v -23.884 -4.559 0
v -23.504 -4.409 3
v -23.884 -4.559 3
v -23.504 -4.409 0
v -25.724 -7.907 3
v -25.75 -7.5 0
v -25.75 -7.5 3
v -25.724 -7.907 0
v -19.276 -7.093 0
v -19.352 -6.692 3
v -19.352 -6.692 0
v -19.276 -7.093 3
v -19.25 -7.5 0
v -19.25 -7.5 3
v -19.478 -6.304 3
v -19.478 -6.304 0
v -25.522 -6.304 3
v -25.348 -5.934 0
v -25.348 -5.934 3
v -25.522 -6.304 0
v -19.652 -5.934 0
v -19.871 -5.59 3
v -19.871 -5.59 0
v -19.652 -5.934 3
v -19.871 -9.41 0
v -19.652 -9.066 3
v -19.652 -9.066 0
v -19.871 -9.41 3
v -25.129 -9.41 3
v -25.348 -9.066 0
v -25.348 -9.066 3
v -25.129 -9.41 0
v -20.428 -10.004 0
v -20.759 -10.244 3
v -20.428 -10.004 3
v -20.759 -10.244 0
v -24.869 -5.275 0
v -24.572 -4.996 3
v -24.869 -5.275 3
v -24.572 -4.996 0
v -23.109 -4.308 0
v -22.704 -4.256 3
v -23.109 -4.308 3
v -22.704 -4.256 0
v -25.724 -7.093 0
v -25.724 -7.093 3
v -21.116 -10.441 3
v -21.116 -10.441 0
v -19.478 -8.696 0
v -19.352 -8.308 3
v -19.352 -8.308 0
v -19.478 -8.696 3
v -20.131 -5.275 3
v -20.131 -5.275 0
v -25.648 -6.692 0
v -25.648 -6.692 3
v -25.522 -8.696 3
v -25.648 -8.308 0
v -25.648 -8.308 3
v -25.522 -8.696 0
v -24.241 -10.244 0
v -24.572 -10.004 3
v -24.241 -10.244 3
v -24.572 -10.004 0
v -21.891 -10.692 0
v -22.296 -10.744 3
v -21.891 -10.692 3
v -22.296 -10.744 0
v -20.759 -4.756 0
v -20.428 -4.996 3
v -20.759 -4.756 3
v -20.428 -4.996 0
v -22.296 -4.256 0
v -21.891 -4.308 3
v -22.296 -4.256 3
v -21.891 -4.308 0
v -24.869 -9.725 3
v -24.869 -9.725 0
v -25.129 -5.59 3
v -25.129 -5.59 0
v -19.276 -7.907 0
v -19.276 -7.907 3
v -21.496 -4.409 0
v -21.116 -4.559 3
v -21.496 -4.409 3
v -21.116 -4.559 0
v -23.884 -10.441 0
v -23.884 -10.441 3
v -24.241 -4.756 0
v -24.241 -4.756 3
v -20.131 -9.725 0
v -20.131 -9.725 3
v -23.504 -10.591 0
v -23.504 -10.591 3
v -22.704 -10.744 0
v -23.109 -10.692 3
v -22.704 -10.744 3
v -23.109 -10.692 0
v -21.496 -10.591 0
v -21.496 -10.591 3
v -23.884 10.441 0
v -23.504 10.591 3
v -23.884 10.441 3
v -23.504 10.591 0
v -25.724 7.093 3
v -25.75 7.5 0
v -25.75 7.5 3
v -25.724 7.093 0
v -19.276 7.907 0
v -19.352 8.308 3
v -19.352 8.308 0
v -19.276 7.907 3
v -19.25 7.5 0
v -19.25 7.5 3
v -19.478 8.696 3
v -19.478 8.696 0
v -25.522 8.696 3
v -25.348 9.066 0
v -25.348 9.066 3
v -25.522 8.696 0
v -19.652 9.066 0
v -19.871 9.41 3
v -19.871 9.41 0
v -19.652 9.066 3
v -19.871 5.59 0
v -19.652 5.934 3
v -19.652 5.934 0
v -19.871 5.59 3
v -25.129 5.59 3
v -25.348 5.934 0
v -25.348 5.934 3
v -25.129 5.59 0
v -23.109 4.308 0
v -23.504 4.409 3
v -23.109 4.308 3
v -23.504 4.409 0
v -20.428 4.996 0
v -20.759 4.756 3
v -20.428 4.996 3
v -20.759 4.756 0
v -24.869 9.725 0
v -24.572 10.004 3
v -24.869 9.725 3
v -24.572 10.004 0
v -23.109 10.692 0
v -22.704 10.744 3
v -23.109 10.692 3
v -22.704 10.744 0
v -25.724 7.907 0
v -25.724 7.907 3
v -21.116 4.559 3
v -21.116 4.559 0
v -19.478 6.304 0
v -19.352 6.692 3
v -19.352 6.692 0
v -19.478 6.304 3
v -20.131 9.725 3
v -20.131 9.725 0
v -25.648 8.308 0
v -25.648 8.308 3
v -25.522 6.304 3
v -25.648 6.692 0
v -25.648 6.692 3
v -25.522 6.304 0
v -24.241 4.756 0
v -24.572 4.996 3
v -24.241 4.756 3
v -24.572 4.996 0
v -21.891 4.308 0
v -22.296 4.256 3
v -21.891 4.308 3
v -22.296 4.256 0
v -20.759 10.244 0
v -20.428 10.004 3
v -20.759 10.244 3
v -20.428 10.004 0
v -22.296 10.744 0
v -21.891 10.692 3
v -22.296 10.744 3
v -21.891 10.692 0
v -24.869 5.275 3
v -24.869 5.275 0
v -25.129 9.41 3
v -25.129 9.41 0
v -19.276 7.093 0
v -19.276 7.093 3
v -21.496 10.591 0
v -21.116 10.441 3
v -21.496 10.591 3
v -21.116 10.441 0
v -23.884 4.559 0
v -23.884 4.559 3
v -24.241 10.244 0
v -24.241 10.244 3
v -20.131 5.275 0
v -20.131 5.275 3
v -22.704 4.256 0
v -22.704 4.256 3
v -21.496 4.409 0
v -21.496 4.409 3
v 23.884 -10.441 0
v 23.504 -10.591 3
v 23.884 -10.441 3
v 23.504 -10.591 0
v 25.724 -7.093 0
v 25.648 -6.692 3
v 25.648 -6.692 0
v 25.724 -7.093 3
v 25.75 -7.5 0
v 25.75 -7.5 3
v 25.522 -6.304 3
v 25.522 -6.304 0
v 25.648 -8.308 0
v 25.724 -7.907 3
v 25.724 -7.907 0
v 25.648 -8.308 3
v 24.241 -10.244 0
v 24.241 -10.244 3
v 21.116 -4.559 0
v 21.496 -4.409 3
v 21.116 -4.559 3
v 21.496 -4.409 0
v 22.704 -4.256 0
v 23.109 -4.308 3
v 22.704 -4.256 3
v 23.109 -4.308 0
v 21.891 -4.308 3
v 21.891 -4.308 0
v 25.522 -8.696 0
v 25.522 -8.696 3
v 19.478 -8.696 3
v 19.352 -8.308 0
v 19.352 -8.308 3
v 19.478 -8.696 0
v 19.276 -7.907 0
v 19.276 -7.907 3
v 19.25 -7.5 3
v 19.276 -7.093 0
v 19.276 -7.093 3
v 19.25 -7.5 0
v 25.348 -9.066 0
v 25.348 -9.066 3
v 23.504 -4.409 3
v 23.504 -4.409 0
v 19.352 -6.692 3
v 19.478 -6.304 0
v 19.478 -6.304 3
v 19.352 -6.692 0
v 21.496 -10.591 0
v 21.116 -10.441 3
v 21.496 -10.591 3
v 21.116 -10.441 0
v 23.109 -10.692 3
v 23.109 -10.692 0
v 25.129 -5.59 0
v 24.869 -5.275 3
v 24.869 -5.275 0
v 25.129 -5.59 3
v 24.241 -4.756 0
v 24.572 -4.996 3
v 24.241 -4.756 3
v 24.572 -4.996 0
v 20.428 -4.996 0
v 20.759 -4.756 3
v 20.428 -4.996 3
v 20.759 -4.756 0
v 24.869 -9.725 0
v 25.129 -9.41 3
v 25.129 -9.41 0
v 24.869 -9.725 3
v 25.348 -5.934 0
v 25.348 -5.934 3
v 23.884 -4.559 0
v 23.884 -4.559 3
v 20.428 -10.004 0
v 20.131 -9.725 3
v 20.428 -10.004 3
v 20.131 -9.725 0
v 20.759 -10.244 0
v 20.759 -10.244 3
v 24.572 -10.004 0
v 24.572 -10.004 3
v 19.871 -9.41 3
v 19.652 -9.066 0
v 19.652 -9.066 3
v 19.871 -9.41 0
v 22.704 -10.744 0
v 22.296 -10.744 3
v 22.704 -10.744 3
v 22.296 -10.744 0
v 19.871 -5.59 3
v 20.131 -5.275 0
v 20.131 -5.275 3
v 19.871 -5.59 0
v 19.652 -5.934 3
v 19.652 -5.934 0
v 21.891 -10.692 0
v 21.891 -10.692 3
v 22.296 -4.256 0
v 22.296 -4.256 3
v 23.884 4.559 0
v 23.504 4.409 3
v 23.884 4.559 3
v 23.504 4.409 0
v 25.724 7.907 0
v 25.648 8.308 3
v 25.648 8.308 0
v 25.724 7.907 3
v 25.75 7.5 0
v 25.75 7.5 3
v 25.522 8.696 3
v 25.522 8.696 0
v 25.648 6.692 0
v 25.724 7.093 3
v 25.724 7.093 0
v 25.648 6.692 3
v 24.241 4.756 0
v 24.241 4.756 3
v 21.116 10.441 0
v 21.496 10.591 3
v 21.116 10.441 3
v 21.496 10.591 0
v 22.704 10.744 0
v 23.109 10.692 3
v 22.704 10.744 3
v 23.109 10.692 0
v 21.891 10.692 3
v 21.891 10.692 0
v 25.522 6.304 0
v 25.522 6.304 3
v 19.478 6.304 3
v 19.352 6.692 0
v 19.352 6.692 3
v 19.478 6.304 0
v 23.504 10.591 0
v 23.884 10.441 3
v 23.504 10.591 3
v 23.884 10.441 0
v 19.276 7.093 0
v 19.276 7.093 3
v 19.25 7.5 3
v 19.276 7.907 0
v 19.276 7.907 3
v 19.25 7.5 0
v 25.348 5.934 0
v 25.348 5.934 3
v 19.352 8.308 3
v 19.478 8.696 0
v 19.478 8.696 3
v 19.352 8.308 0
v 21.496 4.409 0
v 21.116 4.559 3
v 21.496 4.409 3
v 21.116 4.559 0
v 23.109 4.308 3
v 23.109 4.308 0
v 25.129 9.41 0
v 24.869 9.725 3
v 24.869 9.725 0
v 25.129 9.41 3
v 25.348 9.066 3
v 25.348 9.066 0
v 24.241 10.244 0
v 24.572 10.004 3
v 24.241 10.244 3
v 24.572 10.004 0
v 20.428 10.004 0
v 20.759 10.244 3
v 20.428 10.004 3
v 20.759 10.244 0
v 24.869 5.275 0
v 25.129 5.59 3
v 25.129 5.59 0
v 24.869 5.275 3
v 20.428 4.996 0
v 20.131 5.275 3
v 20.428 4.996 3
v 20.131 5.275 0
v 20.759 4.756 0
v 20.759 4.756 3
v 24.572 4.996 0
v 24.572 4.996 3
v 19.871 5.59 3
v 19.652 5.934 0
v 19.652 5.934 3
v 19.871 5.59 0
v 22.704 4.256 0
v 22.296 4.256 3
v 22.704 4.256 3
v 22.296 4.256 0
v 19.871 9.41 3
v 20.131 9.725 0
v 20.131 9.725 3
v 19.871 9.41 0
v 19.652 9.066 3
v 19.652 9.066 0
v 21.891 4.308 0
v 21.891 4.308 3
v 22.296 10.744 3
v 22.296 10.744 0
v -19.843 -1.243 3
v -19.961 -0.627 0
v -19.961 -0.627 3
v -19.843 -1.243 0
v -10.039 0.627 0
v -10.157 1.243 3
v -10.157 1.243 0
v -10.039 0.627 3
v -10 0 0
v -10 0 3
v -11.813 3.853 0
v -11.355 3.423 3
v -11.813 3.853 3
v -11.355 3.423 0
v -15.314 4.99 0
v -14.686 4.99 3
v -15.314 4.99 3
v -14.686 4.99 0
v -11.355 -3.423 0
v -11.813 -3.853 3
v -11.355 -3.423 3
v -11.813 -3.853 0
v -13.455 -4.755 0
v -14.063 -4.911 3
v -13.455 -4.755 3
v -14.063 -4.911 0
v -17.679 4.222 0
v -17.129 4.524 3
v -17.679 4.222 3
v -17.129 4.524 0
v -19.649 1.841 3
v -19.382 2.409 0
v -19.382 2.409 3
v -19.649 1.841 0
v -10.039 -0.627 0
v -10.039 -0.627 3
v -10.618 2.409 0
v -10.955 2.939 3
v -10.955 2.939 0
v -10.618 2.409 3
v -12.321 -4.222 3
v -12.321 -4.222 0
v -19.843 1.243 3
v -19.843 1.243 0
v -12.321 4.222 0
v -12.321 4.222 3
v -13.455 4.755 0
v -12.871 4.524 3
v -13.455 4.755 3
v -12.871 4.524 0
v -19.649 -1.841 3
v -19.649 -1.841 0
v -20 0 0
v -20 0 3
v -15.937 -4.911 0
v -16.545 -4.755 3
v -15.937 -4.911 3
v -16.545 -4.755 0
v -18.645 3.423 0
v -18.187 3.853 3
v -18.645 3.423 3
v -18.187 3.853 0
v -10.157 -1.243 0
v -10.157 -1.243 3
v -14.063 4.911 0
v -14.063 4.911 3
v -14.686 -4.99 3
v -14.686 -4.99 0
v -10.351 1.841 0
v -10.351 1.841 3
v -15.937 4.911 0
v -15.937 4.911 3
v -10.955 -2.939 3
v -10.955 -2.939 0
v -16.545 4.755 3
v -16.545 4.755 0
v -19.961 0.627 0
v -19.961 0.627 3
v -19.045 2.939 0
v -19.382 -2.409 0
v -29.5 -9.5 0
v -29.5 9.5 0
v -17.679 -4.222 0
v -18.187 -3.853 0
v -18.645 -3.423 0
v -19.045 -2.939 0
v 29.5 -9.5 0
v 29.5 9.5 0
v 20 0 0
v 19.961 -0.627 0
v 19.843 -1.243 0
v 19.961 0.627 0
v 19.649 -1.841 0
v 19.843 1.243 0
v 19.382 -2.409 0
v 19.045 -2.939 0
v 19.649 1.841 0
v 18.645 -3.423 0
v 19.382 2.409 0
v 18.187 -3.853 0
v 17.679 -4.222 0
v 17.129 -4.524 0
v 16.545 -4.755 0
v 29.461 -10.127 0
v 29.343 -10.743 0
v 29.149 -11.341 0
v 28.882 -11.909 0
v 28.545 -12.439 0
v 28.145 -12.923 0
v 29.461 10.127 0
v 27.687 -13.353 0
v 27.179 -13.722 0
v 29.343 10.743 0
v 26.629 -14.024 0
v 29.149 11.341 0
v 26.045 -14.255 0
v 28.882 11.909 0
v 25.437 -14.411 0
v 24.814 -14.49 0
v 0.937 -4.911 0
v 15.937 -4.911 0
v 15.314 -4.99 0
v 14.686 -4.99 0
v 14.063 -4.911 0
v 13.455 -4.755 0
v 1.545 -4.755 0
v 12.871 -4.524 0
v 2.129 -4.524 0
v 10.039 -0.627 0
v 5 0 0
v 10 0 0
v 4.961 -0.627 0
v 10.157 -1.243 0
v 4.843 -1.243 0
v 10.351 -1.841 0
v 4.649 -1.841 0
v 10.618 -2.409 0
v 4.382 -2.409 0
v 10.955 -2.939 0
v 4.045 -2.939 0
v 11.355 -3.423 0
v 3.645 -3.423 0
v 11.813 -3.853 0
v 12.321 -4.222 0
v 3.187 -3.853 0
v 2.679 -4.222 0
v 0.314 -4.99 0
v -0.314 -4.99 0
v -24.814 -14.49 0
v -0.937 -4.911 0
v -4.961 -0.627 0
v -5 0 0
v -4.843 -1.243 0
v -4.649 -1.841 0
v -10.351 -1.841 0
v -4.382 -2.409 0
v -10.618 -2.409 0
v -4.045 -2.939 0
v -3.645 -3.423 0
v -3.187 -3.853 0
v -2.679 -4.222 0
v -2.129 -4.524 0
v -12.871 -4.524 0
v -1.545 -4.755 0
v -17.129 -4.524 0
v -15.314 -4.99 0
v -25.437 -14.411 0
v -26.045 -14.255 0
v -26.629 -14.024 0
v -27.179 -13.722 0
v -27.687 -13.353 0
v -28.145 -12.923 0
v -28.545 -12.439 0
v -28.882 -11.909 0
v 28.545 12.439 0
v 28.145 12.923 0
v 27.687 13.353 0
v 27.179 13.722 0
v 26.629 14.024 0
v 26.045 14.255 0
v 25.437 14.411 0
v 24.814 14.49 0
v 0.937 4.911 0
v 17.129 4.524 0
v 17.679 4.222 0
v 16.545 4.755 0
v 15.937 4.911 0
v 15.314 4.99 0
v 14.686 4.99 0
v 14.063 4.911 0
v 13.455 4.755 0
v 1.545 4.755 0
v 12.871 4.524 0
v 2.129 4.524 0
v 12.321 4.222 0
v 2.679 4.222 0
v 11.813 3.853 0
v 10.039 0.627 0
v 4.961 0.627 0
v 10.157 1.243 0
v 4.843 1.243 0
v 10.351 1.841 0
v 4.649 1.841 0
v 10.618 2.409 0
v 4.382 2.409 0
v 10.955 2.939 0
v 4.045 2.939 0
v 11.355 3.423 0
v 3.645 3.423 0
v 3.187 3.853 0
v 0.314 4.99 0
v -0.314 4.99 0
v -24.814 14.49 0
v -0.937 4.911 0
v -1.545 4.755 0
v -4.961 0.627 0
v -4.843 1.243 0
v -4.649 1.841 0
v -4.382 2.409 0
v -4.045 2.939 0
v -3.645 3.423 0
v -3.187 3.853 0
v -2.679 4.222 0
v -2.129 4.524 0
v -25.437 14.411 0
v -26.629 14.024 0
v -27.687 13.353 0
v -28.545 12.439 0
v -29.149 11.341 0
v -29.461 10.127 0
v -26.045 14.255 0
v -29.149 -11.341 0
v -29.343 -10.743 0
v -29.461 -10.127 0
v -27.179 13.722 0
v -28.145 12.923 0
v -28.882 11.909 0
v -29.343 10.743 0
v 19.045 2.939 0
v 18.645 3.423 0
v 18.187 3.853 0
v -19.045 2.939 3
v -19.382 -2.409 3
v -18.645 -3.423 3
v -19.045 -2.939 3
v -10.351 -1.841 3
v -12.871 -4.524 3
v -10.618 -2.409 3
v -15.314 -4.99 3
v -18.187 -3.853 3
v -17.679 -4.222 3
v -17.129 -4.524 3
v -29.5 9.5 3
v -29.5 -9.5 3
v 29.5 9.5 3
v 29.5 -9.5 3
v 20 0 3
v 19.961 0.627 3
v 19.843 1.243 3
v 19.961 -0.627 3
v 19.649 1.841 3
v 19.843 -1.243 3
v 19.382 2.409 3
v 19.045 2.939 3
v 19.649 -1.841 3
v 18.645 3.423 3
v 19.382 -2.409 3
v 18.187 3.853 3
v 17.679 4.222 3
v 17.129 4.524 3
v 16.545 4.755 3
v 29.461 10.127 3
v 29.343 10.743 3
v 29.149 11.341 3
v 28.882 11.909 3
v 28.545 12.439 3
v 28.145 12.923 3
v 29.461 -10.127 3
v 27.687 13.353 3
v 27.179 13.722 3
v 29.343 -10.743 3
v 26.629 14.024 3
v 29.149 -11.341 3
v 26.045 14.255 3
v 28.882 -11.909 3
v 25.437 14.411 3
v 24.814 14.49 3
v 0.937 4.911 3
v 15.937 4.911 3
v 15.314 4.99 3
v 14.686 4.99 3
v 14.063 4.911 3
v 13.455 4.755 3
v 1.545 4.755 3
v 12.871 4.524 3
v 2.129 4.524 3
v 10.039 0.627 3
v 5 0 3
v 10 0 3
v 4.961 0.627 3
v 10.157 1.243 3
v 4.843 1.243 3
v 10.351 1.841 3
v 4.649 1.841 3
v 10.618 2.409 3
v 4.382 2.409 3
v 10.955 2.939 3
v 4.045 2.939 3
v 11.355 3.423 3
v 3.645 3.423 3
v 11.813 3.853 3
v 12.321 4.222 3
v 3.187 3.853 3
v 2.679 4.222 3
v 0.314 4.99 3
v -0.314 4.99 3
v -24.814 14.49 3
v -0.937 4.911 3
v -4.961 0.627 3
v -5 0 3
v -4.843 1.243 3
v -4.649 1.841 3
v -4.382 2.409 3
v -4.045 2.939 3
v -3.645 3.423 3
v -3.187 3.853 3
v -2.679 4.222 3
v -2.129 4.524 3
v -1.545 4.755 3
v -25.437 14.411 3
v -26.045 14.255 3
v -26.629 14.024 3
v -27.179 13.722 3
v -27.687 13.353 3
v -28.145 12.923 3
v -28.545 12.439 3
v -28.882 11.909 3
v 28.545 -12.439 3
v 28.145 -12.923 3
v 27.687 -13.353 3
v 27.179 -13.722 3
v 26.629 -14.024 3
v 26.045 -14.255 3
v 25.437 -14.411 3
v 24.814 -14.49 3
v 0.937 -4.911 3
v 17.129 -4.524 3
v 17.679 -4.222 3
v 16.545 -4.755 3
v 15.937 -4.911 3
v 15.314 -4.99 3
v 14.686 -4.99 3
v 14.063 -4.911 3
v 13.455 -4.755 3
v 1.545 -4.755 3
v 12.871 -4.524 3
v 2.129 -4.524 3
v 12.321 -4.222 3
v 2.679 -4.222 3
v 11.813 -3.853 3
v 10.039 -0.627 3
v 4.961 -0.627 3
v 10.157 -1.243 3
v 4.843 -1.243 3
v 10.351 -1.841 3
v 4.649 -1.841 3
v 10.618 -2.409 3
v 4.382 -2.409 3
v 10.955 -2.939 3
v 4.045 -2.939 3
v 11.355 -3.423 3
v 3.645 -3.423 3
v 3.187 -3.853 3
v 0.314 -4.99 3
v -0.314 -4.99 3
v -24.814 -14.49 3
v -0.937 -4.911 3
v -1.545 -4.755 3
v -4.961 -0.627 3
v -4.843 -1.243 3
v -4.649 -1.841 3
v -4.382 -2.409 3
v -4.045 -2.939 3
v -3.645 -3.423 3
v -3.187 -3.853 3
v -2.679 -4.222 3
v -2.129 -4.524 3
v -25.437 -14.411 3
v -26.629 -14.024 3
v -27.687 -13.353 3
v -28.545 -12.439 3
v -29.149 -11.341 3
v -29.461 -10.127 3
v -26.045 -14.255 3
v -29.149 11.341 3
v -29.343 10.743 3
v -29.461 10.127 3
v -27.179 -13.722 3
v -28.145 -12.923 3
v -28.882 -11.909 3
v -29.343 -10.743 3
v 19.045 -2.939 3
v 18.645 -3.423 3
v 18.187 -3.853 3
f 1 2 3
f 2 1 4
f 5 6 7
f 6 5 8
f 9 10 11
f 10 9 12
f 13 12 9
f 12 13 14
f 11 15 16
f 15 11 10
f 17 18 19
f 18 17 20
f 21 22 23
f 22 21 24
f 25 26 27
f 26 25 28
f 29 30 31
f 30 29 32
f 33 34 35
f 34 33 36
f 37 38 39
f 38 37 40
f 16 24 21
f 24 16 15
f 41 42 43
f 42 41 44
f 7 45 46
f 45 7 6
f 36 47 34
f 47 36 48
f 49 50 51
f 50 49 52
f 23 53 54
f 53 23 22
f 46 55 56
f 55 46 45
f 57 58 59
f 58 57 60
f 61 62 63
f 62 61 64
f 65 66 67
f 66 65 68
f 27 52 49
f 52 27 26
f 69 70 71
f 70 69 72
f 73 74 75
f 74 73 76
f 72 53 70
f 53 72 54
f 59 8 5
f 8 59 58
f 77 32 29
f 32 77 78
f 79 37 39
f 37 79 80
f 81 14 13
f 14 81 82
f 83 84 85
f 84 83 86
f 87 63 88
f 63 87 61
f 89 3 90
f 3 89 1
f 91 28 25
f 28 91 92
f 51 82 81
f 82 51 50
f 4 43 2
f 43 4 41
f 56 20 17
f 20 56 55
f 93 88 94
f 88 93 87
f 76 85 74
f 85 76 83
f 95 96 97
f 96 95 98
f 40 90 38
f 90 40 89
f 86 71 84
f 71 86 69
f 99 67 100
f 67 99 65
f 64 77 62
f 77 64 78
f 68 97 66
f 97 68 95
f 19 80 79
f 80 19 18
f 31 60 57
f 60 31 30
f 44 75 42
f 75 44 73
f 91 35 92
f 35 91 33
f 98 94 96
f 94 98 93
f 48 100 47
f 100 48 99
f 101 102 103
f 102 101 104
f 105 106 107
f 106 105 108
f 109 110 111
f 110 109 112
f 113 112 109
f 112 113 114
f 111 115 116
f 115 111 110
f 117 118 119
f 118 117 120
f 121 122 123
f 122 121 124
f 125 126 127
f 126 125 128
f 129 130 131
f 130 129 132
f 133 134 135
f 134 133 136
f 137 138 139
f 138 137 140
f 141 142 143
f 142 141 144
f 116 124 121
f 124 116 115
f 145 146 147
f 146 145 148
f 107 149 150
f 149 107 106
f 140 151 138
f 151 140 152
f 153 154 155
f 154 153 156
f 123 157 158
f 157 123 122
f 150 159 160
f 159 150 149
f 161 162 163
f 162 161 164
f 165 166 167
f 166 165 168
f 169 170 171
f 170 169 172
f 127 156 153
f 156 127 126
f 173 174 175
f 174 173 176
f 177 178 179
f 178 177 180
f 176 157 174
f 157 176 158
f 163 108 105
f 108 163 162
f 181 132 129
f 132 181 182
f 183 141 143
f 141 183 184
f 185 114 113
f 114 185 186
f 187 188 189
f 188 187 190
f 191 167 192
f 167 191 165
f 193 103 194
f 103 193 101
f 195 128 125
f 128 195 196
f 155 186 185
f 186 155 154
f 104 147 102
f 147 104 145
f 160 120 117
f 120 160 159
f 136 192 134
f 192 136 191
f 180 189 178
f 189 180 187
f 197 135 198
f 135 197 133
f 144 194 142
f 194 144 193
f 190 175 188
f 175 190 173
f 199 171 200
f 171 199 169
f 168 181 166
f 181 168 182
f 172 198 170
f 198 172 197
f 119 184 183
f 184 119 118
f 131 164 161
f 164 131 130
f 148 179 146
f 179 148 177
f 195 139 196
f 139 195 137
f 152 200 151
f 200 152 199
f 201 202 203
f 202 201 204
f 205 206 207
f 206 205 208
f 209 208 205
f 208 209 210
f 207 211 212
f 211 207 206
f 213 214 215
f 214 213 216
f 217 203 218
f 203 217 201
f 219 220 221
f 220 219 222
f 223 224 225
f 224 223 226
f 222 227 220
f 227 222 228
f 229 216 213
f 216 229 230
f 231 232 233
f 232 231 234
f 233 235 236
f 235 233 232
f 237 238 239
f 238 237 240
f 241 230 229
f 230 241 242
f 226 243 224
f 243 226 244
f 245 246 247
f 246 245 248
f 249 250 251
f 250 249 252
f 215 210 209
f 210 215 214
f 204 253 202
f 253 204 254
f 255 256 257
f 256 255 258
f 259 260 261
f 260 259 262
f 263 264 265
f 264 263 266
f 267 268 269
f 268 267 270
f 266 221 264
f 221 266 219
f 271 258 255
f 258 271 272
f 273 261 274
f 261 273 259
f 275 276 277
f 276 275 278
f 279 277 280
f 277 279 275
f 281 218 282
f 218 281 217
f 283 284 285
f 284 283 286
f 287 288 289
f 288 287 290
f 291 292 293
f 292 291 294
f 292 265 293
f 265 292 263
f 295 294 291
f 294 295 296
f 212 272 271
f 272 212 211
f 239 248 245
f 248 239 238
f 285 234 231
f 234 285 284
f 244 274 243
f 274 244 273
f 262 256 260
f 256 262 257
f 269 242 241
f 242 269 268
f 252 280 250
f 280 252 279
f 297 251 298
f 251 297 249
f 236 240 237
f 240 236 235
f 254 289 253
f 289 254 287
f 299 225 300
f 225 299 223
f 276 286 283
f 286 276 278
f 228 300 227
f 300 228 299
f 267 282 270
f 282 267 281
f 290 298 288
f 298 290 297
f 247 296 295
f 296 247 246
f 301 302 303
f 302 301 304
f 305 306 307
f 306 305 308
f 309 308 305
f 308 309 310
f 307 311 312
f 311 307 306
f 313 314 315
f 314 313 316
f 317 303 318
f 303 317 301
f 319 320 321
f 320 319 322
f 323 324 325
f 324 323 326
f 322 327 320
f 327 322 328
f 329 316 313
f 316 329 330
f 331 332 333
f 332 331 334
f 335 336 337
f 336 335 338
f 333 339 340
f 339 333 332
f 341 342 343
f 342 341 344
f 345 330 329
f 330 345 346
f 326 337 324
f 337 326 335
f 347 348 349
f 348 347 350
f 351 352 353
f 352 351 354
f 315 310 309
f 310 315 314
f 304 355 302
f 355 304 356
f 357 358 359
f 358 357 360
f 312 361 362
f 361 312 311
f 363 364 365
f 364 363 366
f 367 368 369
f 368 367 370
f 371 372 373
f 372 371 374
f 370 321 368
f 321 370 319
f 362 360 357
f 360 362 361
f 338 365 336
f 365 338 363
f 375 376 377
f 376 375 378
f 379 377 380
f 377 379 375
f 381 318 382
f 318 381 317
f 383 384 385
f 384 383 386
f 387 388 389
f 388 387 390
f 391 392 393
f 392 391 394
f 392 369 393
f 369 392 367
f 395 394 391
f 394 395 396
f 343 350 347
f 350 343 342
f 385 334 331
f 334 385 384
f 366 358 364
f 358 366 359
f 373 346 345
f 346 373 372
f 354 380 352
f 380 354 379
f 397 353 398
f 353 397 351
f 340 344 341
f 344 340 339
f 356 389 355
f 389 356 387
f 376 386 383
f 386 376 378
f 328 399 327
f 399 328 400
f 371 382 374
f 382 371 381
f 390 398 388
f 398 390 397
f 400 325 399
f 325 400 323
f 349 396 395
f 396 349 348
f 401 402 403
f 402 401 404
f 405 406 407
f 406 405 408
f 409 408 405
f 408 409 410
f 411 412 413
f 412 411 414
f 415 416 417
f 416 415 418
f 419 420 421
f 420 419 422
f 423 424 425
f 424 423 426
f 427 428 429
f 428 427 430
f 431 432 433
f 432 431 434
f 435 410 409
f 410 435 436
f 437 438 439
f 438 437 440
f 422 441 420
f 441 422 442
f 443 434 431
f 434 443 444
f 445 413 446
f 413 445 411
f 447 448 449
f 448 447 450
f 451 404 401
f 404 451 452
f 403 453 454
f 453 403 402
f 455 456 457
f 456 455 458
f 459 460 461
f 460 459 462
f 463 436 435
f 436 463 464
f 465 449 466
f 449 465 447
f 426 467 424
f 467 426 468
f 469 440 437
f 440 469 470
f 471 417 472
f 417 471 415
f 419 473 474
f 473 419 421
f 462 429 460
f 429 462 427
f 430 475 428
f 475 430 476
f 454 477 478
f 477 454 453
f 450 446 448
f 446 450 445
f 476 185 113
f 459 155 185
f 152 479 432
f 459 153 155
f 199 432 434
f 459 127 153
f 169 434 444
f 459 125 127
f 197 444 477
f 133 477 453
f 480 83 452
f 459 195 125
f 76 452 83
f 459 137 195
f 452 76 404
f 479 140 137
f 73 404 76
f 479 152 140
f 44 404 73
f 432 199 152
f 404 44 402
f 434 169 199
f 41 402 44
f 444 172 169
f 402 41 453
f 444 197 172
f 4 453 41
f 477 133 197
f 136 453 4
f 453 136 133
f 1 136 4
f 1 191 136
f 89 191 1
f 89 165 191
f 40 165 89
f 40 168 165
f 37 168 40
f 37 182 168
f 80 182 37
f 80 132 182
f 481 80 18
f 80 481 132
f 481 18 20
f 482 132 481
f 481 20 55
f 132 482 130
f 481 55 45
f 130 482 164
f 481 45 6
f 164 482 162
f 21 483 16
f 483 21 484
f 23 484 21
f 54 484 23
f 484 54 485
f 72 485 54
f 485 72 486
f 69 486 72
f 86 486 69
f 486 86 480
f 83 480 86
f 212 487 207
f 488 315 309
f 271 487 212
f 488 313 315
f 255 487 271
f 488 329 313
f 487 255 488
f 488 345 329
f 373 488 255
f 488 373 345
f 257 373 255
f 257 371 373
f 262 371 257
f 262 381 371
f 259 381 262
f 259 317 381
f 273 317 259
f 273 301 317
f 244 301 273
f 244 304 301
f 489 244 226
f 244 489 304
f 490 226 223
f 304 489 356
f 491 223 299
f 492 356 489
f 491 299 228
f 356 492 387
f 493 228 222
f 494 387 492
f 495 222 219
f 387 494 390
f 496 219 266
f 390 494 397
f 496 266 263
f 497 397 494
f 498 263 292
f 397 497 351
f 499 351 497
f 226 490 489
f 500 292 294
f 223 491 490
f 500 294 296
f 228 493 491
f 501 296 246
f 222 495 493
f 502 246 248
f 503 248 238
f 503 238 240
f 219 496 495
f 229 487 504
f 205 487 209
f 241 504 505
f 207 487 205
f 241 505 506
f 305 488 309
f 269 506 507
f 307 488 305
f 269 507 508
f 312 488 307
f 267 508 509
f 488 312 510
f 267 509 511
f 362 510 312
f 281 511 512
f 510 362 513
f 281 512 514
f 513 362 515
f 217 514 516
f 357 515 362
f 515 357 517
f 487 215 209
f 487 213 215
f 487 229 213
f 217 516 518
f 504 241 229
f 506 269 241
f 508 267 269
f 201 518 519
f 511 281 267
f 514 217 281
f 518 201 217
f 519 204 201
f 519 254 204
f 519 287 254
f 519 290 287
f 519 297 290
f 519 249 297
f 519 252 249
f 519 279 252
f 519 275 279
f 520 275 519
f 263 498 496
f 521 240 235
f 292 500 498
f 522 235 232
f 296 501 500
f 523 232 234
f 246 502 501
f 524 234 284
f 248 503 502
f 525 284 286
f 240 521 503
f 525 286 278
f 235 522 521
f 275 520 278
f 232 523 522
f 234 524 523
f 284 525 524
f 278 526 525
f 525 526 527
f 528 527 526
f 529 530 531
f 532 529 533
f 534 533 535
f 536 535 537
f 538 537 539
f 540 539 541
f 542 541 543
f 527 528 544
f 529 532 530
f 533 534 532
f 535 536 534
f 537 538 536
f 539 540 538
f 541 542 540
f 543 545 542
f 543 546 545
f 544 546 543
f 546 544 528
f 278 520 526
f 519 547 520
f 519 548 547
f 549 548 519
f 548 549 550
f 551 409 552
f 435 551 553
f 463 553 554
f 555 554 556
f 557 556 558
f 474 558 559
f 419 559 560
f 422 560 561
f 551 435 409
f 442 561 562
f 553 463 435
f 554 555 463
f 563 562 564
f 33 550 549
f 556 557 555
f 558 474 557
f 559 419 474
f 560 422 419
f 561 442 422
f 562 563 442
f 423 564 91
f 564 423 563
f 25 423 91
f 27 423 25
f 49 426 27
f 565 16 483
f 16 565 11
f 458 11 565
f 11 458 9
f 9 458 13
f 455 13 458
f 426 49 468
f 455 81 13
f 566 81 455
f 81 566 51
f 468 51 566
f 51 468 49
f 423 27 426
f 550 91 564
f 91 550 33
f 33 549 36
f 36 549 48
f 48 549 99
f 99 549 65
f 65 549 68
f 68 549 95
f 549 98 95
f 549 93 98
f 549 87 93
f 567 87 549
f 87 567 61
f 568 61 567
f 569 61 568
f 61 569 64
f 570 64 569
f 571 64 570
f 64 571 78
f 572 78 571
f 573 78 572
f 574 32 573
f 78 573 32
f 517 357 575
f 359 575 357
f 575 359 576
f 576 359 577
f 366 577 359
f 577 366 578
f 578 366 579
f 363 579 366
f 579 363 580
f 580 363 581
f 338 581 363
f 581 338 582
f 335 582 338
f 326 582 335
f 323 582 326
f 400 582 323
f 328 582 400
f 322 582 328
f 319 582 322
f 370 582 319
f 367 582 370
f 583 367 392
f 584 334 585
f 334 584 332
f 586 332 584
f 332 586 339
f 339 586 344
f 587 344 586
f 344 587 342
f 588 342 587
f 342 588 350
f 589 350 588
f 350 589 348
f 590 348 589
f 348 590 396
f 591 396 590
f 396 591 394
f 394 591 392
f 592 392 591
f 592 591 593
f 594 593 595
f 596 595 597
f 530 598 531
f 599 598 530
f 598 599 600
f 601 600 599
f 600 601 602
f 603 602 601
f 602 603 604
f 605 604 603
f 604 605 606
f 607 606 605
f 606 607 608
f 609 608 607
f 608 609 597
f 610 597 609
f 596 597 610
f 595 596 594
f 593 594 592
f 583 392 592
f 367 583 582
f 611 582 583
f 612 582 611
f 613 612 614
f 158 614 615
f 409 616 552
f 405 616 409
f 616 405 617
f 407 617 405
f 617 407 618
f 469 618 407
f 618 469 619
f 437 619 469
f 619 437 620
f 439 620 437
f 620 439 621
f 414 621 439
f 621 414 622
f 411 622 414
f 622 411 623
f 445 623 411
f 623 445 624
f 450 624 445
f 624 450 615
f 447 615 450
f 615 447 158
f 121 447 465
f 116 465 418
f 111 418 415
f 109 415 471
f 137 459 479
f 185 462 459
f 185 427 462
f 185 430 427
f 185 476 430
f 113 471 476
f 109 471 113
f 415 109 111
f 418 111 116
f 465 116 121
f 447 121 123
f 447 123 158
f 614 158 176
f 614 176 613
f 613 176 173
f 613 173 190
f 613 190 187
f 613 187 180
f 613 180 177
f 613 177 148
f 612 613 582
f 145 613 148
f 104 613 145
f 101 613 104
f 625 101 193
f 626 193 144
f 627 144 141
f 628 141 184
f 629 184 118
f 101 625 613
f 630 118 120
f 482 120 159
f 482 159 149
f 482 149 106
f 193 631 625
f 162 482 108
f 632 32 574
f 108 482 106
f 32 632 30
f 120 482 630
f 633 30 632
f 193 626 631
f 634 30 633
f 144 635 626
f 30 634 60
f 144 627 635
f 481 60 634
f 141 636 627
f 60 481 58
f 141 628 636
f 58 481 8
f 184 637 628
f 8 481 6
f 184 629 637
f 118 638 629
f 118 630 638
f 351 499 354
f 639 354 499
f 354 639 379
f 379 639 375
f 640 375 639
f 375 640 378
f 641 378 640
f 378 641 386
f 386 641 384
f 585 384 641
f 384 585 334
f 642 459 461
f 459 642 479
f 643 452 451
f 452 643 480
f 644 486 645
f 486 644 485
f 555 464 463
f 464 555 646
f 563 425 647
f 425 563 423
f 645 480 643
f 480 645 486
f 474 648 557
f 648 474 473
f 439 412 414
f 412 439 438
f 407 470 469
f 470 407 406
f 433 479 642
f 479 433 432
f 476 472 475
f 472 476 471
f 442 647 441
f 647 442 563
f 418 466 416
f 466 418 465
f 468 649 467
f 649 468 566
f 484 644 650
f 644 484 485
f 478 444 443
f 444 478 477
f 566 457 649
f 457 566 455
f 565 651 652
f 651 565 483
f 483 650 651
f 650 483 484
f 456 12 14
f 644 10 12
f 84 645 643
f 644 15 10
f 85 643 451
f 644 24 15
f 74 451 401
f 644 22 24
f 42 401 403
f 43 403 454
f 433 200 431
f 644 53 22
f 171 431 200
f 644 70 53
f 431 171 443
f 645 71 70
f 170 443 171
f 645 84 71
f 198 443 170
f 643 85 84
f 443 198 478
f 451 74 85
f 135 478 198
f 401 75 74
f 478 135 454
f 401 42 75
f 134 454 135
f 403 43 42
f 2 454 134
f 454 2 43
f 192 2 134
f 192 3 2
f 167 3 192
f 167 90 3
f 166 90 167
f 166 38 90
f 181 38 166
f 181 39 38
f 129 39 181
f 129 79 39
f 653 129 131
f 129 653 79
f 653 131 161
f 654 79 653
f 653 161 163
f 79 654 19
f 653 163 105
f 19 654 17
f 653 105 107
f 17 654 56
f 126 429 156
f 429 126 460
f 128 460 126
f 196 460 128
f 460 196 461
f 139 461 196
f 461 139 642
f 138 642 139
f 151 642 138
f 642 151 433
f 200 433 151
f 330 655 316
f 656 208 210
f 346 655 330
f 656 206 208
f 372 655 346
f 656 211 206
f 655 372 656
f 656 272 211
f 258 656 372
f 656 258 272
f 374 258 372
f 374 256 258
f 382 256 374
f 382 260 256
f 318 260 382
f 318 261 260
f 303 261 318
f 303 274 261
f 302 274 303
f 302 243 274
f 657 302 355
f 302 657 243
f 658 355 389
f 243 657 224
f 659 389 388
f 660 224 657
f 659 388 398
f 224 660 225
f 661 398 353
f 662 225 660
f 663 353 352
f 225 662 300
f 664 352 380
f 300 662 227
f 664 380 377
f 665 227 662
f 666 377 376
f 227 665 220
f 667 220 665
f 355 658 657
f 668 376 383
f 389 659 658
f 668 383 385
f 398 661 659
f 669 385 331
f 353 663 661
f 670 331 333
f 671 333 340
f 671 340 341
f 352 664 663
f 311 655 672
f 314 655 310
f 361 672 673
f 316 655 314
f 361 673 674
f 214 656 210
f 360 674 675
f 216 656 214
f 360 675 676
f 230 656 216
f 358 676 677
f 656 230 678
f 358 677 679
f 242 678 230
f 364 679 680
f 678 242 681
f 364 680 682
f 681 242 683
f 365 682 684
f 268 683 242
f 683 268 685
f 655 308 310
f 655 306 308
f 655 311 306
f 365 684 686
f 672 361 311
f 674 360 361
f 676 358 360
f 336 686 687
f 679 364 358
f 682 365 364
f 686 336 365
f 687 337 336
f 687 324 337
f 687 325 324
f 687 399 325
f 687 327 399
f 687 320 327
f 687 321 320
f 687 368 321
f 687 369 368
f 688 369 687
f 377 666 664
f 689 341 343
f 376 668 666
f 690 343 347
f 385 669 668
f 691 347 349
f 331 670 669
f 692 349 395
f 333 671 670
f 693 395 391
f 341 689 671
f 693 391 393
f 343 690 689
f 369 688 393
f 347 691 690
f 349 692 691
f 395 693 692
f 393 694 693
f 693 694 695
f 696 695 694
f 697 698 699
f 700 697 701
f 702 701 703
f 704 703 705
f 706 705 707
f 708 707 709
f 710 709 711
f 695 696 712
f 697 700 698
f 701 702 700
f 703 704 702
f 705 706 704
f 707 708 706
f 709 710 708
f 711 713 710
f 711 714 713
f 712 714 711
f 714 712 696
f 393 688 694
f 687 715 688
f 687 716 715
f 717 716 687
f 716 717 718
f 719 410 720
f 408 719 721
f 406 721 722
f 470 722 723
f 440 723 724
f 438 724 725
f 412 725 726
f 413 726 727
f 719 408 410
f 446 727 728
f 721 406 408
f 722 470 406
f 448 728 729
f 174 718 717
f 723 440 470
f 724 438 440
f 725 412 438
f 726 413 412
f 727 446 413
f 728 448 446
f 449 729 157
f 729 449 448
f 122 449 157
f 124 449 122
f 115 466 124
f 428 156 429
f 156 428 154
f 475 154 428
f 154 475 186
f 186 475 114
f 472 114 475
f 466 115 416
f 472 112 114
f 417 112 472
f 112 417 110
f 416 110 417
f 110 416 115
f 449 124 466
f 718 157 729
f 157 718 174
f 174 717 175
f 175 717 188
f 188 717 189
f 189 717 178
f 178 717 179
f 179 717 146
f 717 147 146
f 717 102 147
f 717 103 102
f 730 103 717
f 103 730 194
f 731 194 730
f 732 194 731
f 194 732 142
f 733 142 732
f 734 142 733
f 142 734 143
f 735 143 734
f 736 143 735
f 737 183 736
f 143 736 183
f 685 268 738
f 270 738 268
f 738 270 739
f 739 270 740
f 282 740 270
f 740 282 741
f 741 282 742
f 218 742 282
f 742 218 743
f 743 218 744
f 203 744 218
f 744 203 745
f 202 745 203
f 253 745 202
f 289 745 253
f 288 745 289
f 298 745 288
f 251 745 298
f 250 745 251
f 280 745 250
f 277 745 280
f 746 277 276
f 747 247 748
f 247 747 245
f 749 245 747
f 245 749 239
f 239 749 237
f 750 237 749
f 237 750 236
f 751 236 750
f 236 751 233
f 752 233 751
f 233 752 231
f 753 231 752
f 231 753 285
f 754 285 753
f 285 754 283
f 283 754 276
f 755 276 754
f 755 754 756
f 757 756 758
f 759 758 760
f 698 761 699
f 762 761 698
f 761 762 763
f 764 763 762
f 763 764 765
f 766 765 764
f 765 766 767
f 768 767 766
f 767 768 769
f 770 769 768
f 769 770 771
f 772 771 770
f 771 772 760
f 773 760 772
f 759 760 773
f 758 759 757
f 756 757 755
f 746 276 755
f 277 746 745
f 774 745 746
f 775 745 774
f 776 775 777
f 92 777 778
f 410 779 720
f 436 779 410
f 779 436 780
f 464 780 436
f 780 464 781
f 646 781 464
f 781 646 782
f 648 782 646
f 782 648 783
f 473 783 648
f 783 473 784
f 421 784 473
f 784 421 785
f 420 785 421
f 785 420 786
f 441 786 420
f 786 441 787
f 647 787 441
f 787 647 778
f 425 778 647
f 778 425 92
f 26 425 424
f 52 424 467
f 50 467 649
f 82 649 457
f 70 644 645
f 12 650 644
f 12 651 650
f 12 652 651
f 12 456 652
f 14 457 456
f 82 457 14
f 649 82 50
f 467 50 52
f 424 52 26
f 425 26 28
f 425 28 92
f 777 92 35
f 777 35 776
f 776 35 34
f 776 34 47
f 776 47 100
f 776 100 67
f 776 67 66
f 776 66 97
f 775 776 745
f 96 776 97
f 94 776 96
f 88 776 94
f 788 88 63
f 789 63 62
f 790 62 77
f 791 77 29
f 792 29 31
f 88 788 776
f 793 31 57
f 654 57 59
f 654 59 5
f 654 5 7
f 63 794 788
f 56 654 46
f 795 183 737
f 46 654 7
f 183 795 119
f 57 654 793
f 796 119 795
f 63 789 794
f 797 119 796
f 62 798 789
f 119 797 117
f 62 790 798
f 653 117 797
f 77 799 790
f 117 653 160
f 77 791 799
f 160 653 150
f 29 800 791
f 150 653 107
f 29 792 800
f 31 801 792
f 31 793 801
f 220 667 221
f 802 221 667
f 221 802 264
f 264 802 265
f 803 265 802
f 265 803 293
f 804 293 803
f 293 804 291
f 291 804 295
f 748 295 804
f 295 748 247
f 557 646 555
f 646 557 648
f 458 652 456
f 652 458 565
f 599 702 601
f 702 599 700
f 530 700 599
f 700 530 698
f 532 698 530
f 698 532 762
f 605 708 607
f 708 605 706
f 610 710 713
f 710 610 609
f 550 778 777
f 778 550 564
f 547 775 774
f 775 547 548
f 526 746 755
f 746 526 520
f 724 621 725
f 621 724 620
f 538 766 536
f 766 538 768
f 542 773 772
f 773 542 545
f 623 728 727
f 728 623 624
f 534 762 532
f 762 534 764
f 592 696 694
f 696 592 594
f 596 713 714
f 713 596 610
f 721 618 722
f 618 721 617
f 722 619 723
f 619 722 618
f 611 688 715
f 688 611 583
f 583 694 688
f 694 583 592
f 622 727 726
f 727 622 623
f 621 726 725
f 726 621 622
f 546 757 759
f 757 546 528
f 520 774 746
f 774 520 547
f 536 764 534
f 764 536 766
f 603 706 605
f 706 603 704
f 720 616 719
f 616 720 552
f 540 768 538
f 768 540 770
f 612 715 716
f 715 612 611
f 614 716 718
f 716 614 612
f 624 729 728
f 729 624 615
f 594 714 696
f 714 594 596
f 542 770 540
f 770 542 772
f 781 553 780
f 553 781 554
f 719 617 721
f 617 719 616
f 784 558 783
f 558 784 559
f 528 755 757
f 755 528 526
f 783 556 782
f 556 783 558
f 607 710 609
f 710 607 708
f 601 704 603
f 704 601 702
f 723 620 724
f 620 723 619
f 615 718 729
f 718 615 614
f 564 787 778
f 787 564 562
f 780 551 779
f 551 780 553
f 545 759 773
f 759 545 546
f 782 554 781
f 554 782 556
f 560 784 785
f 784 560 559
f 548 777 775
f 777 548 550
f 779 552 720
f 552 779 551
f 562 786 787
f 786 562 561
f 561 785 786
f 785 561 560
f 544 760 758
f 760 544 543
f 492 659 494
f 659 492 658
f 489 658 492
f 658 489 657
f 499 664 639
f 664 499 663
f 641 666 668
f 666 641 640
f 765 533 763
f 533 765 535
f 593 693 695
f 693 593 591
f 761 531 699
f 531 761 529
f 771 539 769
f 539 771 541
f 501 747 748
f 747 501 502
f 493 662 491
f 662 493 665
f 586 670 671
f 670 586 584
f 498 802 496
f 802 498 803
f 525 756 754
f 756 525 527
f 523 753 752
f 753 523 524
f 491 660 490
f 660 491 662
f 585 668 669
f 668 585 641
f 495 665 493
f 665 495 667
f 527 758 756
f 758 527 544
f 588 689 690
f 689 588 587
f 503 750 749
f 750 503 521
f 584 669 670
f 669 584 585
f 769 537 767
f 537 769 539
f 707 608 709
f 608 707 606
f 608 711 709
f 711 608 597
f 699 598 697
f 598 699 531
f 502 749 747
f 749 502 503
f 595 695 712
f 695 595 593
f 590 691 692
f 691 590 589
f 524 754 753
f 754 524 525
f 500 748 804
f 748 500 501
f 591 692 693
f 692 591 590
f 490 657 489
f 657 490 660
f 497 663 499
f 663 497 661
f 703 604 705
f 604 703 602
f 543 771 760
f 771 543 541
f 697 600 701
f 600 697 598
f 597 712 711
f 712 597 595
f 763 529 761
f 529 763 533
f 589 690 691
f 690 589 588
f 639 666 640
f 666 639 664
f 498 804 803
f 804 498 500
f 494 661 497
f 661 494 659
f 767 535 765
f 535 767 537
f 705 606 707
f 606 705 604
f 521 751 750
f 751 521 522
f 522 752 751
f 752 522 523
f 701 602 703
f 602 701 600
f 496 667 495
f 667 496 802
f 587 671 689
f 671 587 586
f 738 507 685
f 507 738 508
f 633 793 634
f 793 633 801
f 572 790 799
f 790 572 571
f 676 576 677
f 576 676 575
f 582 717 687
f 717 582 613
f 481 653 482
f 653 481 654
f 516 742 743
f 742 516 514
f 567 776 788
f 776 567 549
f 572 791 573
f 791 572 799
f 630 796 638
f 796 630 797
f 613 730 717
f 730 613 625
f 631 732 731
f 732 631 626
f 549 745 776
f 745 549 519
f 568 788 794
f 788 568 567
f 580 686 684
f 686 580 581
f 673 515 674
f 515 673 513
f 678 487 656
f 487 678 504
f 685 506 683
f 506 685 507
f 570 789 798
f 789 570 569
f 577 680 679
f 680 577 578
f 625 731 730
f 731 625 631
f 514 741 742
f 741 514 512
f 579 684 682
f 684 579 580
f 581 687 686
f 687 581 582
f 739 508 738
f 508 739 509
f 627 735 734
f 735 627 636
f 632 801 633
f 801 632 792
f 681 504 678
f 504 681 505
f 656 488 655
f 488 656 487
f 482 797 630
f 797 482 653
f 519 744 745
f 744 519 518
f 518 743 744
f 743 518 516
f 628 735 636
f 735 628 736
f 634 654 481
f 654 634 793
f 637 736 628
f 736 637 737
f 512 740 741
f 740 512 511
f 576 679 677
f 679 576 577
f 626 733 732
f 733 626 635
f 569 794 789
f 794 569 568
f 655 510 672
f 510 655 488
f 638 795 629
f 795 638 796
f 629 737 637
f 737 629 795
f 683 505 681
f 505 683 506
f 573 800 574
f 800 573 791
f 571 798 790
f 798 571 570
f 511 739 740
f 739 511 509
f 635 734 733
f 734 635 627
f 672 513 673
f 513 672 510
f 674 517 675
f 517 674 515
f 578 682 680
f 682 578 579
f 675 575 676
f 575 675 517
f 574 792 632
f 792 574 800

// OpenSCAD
$fn = 50;


difference() {
	union() {
		hull() {
			translate(v = [-24.5000000000, 9.5000000000, 0]) {
				cylinder(h = 3, r = 5);
			}
			translate(v = [24.5000000000, 9.5000000000, 0]) {
				cylinder(h = 3, r = 5);
			}
			translate(v = [-24.5000000000, -9.5000000000, 0]) {
				cylinder(h = 3, r = 5);
			}
			translate(v = [24.5000000000, -9.5000000000, 0]) {
				cylinder(h = 3, r = 5);
			}
		}
	}
	union() {
		#translate(v = [-22.5000000000, -7.5000000000, -100.0000000000]) {
			cylinder(h = 200, r = 3.2500000000);
		}
		#translate(v = [-22.5000000000, 7.5000000000, -100.0000000000]) {
			cylinder(h = 200, r = 3.2500000000);
		}
		#translate(v = [22.5000000000, -7.5000000000, -100.0000000000]) {
			cylinder(h = 200, r = 3.2500000000);
		}
		#translate(v = [22.5000000000, 7.5000000000, -100.0000000000]) {
			cylinder(h = 200, r = 3.2500000000);
		}
		#translate(v = [-15.0000000000, 0, 0]) {
			cylinder(h = 3, r = 5.0000000000);
		}
		#cylinder(h = 3, r = 5.0000000000);
		#translate(v = [15.0000000000, 0, 0]) {
			cylinder(h = 3, r = 5.0000000000);
		}
	}
}
